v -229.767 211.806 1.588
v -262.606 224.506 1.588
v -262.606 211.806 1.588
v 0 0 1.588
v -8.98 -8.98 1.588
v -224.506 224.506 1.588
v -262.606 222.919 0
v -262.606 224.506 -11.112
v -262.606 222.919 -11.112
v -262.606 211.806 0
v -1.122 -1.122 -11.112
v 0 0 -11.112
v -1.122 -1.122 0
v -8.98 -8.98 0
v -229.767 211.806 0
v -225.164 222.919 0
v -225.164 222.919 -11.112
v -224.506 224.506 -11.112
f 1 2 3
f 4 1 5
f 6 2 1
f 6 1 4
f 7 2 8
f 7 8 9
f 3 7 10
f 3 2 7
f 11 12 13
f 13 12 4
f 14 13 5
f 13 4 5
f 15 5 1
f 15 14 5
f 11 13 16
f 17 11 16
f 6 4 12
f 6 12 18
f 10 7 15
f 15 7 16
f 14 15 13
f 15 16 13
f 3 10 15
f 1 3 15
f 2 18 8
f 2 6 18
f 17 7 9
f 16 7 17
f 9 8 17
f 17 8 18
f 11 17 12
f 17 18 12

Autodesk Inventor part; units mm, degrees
ref_plane "YZ Plane" through (0, 0, 0) normal (1, 0, 0) x (0, 1, 0)
ref_plane "XZ Plane" through (0, 0, 0) normal (0, 1, 0) x (-1, 0, 0)
ref_plane "XY Plane" through (0, 0, 0) normal (0, 0, 1) x (1, 0, 0)
sketch "Sketch1" plane through (0, 0, 0) normal (0, 0, 1) x (1, 0, 0)
  line L0 (0, 0) -> (-224.5064, 224.5064)
  line L1 (0, 0) -> (317.5, 0) construction
  line L2 (-224.5064, 224.5064) -> (-262.6064, 224.5064)
  line L3 (-262.6064, 224.5064) -> (-262.6064, 211.8064)
  line L4 (-262.6064, 211.8064) -> (-229.7669, 211.8064)
  line L5 (-229.7669, 211.8064) -> (-224.5064, 224.5064)
  line L6 (0, 0) -> (-8.9803, -8.9803)
  line L7 (-8.9803, -8.9803) -> (-229.7669, 211.8064)
  line L8 (0, 0) -> (-1.1225, -1.1225)
  line L9 (-1.1225, -1.1225) -> (-225.164, 222.9189)
  line L10 (-262.6064, 224.5064) -> (-262.6064, 222.9189)
  line L11 (-262.6064, 222.9189) -> (-225.164, 222.9189)
  dimension "d0" = 317.5
  dimension "d1" = 135
  dimension "d2" = 38.1
  dimension "d3" = 12.7
  dimension "d5" = 12.7
  dimension "d6" = 90
  dimension "d9" = 1.5875
  dimension "d10" = 1.5875
  dimension "d11" = 90
extrude "Extrusion1" add sketch "Sketch1" along normal blind 1.5875
extrude "Extrusion3" add sketch "Sketch1" against normal blind 11.1125 contours L5 L11 L3 L2
extrude "Extrusion4" add sketch "Sketch1" against normal blind 11.1125 contours L6 L9 L5 L0
properties part number "DiagL"
